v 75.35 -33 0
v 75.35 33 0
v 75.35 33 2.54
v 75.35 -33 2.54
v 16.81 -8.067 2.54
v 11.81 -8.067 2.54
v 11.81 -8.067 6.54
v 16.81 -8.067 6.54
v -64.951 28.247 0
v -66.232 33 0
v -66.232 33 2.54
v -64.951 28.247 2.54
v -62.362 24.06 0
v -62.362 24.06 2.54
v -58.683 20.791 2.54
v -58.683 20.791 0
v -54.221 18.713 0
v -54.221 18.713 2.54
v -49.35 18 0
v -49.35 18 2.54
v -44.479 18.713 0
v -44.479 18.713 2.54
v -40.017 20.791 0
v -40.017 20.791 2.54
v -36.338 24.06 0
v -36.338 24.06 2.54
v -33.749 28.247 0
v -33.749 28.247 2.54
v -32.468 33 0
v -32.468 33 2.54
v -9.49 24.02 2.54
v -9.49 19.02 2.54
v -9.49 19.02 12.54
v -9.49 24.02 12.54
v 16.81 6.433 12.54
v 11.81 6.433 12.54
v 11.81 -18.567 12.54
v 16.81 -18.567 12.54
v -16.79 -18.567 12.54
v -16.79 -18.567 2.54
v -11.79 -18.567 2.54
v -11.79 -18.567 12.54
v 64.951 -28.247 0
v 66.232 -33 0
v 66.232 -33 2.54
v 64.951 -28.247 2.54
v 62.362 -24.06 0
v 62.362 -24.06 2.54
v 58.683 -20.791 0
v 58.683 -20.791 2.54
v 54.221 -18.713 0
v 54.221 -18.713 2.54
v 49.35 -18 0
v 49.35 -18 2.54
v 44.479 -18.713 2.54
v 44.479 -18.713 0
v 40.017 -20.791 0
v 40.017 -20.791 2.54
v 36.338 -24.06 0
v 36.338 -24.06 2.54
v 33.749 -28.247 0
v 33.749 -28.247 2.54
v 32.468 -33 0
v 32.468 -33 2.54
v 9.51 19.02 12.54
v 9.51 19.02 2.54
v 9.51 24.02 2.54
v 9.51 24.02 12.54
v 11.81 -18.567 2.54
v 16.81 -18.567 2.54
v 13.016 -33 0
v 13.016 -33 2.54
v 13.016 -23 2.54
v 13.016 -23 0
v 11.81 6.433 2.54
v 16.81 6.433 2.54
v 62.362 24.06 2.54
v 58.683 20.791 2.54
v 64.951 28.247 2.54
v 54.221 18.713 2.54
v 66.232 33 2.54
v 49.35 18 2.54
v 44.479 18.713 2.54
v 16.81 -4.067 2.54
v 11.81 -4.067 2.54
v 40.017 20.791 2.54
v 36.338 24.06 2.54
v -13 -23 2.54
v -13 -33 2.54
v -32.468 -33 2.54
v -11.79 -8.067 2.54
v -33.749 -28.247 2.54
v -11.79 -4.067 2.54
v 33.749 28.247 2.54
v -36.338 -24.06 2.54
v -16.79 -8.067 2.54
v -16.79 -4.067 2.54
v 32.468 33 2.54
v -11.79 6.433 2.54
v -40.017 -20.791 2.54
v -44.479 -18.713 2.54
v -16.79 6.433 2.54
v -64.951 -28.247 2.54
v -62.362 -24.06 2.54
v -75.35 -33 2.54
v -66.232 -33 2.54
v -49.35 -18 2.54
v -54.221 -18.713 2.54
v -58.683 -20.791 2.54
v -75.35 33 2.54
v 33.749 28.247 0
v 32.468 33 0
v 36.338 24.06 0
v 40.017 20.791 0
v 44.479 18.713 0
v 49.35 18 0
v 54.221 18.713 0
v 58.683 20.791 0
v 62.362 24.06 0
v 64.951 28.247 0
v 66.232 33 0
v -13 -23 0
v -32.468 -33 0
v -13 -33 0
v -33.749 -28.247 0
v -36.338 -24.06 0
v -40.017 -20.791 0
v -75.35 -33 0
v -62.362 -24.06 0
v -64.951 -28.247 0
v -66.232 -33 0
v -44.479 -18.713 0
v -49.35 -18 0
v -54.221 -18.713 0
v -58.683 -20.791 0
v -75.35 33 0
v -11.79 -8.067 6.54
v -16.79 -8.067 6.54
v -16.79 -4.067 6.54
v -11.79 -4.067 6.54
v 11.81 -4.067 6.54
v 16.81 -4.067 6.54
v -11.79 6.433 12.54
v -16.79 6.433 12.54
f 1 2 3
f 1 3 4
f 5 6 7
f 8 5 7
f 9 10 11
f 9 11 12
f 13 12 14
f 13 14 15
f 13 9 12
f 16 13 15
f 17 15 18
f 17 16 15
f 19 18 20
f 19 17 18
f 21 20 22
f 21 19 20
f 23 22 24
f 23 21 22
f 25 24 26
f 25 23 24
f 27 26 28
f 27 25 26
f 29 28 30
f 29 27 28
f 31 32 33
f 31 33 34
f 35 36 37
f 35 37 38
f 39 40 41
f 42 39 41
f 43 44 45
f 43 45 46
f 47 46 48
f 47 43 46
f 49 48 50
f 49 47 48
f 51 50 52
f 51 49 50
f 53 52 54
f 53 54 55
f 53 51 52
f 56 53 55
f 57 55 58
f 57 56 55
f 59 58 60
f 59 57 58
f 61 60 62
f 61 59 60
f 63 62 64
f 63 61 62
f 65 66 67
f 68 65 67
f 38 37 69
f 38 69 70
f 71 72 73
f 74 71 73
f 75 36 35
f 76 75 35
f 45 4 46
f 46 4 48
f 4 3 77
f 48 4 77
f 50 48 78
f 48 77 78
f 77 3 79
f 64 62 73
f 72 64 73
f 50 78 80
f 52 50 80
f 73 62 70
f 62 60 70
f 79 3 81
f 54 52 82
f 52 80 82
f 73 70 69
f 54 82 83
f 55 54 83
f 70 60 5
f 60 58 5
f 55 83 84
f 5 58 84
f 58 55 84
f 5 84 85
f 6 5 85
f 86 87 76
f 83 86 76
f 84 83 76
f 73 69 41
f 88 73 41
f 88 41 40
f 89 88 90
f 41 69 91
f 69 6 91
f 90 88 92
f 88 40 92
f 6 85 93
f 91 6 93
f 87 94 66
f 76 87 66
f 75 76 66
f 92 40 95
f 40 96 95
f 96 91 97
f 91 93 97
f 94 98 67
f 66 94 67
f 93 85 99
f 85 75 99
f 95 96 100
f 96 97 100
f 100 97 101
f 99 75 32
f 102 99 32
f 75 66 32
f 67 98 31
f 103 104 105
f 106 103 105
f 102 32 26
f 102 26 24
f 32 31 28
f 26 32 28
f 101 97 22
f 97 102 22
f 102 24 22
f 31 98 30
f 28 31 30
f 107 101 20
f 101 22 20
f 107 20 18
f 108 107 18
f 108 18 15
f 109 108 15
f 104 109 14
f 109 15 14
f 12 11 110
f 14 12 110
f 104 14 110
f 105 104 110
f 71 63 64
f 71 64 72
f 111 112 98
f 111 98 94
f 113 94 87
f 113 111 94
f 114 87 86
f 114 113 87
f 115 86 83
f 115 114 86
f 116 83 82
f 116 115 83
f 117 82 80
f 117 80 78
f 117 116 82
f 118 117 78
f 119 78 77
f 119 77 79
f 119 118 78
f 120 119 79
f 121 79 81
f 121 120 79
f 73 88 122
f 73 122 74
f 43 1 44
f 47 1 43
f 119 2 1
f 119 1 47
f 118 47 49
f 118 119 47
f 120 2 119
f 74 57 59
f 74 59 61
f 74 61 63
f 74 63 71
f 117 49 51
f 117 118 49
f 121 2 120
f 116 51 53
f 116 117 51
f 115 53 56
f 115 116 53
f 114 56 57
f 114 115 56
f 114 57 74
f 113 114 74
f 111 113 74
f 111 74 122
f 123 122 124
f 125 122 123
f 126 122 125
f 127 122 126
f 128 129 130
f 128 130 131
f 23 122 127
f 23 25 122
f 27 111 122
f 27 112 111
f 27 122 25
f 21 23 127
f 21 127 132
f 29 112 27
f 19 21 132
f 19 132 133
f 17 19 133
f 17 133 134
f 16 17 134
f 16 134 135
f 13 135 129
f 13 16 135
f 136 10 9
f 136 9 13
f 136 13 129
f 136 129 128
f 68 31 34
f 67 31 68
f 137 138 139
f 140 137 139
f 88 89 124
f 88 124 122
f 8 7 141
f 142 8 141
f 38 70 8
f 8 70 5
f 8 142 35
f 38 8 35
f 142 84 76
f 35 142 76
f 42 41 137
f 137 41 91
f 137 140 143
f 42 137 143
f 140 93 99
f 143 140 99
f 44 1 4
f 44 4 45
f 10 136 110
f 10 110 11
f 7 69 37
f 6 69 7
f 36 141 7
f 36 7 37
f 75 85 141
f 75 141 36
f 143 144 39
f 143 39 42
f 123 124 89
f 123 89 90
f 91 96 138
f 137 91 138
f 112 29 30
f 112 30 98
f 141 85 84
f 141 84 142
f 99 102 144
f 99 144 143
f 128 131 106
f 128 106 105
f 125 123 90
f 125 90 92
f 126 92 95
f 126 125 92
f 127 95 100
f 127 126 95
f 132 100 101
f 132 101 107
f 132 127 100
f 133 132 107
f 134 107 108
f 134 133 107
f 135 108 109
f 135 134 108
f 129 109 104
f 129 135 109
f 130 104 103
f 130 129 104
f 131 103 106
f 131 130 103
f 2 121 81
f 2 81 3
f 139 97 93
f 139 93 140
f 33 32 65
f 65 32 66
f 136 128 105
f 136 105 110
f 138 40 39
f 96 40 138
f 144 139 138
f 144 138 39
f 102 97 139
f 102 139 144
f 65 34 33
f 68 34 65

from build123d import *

# Parameters (mm, degrees)
BOSS_EXTRUDE1_DEPTH = 2.54
SKETCH2_W           = 26.0160991
SKETCH2_H           = 10
CUT_EXTRUDE1_DEPTH  = 2.54
SKETCH6_W           = 5
SKETCH6_H           = 25
BOSS_EXTRUDE2_DEPTH = 10
SKETCH6_3_W         = 19
SKETCH6_3_H         = 5
BOSS_EXTRUDE3_DEPTH = 10
SKETCH6_4_W         = 5
SKETCH6_4_H         = 25
BOSS_EXTRUDE4_DEPTH = 10
SKETCH9_W           = 4
SKETCH9_H           = 4
CUT_EXTRUDE3_DEPTH  = 99.671329208


with BuildPart() as part:
    # Sketch1 → Boss-Extrude1 (new body)
    with BuildSketch(Plane.XY):
        with BuildLine():
            Line((-32.468057, 32.999999883), (-13, 32.999999883))
            Line((-13, 32.999999883), (13, 32.999999883))
            Line((13, 32.999999883), (32.468057241, 32.999999883))
            ThreePointArc((32.468057241, 32.999999883), (49.350000777, 18.000000029), (66.231944118, 33.000000103))
            Line((66.231944118, 33.000000103), (75.350000118, 33.000000103))
            Line((75.350000118, 33.000000103), (75.350000118, -32.999998949))
            Line((75.350000118, -32.999998949), (66.231943, -32.999998949))
            ThreePointArc((66.231943, -32.999998949), (49.349999056, -17.999999409), (32.468056, -32.999999949))
            Line((32.468056, -32.999999949), (13, -32.999999949))
            Line((13, -32.999999949), (-12.999999882, -32.999999949))
            Line((-12.999999882, -32.999999949), (-32.468057, -32.999999117))
            ThreePointArc((-32.468057, -32.999999117), (-49.350000944, -17.999999578), (-66.231944, -33.000000117))
            Line((-66.231944, -33.000000117), (-75.35, -33.000000117))
            Line((-75.35, -33.000000117), (-75.35, 32.999999883))
            Line((-75.35, 32.999999883), (-66.231944, 32.999999883))
            ThreePointArc((-66.231944, 32.999999883), (-49.3500005, 17.999999403), (-32.468057, 32.999999883))
        make_face()
    extrude(amount=BOSS_EXTRUDE1_DEPTH)

    # Sketch2 → Cut-Extrude1 (cut)
    with BuildSketch(Plane.XY.offset(2.54)):
        with Locations((0.008049668, -27.999999949)):
            Rectangle(SKETCH2_W, SKETCH2_H)
    extrude(amount=-CUT_EXTRUDE1_DEPTH, mode=Mode.SUBTRACT)

    # Sketch6 → Boss-Extrude2 (add)
    with BuildSketch(Plane.XY.offset(2.54)):
        with Locations((-14.289999882, -6.066775281)):
            Rectangle(SKETCH6_W, SKETCH6_H)
    extrude(amount=BOSS_EXTRUDE2_DEPTH)

    # Sketch6<3> → Boss-Extrude3 (add)
    with BuildSketch(Plane.XY.offset(2.54)):
        with Locations((0.010000118, 21.520000051)):
            Rectangle(SKETCH6_3_W, SKETCH6_3_H)
    extrude(amount=BOSS_EXTRUDE3_DEPTH)

    # Sketch6<4> → Boss-Extrude4 (add)
    with BuildSketch(Plane.XY.offset(2.54)):
        with Locations((14.310000118, -6.066775281)):
            Rectangle(SKETCH6_4_W, SKETCH6_4_H)
    extrude(amount=BOSS_EXTRUDE4_DEPTH)

    # Sketch9 → Cut-Extrude3 (cut, through all)
    with BuildSketch(Plane.ZY.offset(16.789999882)):
        with Locations((4.54, -6.066775281)):
            Rectangle(SKETCH9_W, SKETCH9_H)
    extrude(amount=-CUT_EXTRUDE3_DEPTH, mode=Mode.SUBTRACT)


solid = part.part
